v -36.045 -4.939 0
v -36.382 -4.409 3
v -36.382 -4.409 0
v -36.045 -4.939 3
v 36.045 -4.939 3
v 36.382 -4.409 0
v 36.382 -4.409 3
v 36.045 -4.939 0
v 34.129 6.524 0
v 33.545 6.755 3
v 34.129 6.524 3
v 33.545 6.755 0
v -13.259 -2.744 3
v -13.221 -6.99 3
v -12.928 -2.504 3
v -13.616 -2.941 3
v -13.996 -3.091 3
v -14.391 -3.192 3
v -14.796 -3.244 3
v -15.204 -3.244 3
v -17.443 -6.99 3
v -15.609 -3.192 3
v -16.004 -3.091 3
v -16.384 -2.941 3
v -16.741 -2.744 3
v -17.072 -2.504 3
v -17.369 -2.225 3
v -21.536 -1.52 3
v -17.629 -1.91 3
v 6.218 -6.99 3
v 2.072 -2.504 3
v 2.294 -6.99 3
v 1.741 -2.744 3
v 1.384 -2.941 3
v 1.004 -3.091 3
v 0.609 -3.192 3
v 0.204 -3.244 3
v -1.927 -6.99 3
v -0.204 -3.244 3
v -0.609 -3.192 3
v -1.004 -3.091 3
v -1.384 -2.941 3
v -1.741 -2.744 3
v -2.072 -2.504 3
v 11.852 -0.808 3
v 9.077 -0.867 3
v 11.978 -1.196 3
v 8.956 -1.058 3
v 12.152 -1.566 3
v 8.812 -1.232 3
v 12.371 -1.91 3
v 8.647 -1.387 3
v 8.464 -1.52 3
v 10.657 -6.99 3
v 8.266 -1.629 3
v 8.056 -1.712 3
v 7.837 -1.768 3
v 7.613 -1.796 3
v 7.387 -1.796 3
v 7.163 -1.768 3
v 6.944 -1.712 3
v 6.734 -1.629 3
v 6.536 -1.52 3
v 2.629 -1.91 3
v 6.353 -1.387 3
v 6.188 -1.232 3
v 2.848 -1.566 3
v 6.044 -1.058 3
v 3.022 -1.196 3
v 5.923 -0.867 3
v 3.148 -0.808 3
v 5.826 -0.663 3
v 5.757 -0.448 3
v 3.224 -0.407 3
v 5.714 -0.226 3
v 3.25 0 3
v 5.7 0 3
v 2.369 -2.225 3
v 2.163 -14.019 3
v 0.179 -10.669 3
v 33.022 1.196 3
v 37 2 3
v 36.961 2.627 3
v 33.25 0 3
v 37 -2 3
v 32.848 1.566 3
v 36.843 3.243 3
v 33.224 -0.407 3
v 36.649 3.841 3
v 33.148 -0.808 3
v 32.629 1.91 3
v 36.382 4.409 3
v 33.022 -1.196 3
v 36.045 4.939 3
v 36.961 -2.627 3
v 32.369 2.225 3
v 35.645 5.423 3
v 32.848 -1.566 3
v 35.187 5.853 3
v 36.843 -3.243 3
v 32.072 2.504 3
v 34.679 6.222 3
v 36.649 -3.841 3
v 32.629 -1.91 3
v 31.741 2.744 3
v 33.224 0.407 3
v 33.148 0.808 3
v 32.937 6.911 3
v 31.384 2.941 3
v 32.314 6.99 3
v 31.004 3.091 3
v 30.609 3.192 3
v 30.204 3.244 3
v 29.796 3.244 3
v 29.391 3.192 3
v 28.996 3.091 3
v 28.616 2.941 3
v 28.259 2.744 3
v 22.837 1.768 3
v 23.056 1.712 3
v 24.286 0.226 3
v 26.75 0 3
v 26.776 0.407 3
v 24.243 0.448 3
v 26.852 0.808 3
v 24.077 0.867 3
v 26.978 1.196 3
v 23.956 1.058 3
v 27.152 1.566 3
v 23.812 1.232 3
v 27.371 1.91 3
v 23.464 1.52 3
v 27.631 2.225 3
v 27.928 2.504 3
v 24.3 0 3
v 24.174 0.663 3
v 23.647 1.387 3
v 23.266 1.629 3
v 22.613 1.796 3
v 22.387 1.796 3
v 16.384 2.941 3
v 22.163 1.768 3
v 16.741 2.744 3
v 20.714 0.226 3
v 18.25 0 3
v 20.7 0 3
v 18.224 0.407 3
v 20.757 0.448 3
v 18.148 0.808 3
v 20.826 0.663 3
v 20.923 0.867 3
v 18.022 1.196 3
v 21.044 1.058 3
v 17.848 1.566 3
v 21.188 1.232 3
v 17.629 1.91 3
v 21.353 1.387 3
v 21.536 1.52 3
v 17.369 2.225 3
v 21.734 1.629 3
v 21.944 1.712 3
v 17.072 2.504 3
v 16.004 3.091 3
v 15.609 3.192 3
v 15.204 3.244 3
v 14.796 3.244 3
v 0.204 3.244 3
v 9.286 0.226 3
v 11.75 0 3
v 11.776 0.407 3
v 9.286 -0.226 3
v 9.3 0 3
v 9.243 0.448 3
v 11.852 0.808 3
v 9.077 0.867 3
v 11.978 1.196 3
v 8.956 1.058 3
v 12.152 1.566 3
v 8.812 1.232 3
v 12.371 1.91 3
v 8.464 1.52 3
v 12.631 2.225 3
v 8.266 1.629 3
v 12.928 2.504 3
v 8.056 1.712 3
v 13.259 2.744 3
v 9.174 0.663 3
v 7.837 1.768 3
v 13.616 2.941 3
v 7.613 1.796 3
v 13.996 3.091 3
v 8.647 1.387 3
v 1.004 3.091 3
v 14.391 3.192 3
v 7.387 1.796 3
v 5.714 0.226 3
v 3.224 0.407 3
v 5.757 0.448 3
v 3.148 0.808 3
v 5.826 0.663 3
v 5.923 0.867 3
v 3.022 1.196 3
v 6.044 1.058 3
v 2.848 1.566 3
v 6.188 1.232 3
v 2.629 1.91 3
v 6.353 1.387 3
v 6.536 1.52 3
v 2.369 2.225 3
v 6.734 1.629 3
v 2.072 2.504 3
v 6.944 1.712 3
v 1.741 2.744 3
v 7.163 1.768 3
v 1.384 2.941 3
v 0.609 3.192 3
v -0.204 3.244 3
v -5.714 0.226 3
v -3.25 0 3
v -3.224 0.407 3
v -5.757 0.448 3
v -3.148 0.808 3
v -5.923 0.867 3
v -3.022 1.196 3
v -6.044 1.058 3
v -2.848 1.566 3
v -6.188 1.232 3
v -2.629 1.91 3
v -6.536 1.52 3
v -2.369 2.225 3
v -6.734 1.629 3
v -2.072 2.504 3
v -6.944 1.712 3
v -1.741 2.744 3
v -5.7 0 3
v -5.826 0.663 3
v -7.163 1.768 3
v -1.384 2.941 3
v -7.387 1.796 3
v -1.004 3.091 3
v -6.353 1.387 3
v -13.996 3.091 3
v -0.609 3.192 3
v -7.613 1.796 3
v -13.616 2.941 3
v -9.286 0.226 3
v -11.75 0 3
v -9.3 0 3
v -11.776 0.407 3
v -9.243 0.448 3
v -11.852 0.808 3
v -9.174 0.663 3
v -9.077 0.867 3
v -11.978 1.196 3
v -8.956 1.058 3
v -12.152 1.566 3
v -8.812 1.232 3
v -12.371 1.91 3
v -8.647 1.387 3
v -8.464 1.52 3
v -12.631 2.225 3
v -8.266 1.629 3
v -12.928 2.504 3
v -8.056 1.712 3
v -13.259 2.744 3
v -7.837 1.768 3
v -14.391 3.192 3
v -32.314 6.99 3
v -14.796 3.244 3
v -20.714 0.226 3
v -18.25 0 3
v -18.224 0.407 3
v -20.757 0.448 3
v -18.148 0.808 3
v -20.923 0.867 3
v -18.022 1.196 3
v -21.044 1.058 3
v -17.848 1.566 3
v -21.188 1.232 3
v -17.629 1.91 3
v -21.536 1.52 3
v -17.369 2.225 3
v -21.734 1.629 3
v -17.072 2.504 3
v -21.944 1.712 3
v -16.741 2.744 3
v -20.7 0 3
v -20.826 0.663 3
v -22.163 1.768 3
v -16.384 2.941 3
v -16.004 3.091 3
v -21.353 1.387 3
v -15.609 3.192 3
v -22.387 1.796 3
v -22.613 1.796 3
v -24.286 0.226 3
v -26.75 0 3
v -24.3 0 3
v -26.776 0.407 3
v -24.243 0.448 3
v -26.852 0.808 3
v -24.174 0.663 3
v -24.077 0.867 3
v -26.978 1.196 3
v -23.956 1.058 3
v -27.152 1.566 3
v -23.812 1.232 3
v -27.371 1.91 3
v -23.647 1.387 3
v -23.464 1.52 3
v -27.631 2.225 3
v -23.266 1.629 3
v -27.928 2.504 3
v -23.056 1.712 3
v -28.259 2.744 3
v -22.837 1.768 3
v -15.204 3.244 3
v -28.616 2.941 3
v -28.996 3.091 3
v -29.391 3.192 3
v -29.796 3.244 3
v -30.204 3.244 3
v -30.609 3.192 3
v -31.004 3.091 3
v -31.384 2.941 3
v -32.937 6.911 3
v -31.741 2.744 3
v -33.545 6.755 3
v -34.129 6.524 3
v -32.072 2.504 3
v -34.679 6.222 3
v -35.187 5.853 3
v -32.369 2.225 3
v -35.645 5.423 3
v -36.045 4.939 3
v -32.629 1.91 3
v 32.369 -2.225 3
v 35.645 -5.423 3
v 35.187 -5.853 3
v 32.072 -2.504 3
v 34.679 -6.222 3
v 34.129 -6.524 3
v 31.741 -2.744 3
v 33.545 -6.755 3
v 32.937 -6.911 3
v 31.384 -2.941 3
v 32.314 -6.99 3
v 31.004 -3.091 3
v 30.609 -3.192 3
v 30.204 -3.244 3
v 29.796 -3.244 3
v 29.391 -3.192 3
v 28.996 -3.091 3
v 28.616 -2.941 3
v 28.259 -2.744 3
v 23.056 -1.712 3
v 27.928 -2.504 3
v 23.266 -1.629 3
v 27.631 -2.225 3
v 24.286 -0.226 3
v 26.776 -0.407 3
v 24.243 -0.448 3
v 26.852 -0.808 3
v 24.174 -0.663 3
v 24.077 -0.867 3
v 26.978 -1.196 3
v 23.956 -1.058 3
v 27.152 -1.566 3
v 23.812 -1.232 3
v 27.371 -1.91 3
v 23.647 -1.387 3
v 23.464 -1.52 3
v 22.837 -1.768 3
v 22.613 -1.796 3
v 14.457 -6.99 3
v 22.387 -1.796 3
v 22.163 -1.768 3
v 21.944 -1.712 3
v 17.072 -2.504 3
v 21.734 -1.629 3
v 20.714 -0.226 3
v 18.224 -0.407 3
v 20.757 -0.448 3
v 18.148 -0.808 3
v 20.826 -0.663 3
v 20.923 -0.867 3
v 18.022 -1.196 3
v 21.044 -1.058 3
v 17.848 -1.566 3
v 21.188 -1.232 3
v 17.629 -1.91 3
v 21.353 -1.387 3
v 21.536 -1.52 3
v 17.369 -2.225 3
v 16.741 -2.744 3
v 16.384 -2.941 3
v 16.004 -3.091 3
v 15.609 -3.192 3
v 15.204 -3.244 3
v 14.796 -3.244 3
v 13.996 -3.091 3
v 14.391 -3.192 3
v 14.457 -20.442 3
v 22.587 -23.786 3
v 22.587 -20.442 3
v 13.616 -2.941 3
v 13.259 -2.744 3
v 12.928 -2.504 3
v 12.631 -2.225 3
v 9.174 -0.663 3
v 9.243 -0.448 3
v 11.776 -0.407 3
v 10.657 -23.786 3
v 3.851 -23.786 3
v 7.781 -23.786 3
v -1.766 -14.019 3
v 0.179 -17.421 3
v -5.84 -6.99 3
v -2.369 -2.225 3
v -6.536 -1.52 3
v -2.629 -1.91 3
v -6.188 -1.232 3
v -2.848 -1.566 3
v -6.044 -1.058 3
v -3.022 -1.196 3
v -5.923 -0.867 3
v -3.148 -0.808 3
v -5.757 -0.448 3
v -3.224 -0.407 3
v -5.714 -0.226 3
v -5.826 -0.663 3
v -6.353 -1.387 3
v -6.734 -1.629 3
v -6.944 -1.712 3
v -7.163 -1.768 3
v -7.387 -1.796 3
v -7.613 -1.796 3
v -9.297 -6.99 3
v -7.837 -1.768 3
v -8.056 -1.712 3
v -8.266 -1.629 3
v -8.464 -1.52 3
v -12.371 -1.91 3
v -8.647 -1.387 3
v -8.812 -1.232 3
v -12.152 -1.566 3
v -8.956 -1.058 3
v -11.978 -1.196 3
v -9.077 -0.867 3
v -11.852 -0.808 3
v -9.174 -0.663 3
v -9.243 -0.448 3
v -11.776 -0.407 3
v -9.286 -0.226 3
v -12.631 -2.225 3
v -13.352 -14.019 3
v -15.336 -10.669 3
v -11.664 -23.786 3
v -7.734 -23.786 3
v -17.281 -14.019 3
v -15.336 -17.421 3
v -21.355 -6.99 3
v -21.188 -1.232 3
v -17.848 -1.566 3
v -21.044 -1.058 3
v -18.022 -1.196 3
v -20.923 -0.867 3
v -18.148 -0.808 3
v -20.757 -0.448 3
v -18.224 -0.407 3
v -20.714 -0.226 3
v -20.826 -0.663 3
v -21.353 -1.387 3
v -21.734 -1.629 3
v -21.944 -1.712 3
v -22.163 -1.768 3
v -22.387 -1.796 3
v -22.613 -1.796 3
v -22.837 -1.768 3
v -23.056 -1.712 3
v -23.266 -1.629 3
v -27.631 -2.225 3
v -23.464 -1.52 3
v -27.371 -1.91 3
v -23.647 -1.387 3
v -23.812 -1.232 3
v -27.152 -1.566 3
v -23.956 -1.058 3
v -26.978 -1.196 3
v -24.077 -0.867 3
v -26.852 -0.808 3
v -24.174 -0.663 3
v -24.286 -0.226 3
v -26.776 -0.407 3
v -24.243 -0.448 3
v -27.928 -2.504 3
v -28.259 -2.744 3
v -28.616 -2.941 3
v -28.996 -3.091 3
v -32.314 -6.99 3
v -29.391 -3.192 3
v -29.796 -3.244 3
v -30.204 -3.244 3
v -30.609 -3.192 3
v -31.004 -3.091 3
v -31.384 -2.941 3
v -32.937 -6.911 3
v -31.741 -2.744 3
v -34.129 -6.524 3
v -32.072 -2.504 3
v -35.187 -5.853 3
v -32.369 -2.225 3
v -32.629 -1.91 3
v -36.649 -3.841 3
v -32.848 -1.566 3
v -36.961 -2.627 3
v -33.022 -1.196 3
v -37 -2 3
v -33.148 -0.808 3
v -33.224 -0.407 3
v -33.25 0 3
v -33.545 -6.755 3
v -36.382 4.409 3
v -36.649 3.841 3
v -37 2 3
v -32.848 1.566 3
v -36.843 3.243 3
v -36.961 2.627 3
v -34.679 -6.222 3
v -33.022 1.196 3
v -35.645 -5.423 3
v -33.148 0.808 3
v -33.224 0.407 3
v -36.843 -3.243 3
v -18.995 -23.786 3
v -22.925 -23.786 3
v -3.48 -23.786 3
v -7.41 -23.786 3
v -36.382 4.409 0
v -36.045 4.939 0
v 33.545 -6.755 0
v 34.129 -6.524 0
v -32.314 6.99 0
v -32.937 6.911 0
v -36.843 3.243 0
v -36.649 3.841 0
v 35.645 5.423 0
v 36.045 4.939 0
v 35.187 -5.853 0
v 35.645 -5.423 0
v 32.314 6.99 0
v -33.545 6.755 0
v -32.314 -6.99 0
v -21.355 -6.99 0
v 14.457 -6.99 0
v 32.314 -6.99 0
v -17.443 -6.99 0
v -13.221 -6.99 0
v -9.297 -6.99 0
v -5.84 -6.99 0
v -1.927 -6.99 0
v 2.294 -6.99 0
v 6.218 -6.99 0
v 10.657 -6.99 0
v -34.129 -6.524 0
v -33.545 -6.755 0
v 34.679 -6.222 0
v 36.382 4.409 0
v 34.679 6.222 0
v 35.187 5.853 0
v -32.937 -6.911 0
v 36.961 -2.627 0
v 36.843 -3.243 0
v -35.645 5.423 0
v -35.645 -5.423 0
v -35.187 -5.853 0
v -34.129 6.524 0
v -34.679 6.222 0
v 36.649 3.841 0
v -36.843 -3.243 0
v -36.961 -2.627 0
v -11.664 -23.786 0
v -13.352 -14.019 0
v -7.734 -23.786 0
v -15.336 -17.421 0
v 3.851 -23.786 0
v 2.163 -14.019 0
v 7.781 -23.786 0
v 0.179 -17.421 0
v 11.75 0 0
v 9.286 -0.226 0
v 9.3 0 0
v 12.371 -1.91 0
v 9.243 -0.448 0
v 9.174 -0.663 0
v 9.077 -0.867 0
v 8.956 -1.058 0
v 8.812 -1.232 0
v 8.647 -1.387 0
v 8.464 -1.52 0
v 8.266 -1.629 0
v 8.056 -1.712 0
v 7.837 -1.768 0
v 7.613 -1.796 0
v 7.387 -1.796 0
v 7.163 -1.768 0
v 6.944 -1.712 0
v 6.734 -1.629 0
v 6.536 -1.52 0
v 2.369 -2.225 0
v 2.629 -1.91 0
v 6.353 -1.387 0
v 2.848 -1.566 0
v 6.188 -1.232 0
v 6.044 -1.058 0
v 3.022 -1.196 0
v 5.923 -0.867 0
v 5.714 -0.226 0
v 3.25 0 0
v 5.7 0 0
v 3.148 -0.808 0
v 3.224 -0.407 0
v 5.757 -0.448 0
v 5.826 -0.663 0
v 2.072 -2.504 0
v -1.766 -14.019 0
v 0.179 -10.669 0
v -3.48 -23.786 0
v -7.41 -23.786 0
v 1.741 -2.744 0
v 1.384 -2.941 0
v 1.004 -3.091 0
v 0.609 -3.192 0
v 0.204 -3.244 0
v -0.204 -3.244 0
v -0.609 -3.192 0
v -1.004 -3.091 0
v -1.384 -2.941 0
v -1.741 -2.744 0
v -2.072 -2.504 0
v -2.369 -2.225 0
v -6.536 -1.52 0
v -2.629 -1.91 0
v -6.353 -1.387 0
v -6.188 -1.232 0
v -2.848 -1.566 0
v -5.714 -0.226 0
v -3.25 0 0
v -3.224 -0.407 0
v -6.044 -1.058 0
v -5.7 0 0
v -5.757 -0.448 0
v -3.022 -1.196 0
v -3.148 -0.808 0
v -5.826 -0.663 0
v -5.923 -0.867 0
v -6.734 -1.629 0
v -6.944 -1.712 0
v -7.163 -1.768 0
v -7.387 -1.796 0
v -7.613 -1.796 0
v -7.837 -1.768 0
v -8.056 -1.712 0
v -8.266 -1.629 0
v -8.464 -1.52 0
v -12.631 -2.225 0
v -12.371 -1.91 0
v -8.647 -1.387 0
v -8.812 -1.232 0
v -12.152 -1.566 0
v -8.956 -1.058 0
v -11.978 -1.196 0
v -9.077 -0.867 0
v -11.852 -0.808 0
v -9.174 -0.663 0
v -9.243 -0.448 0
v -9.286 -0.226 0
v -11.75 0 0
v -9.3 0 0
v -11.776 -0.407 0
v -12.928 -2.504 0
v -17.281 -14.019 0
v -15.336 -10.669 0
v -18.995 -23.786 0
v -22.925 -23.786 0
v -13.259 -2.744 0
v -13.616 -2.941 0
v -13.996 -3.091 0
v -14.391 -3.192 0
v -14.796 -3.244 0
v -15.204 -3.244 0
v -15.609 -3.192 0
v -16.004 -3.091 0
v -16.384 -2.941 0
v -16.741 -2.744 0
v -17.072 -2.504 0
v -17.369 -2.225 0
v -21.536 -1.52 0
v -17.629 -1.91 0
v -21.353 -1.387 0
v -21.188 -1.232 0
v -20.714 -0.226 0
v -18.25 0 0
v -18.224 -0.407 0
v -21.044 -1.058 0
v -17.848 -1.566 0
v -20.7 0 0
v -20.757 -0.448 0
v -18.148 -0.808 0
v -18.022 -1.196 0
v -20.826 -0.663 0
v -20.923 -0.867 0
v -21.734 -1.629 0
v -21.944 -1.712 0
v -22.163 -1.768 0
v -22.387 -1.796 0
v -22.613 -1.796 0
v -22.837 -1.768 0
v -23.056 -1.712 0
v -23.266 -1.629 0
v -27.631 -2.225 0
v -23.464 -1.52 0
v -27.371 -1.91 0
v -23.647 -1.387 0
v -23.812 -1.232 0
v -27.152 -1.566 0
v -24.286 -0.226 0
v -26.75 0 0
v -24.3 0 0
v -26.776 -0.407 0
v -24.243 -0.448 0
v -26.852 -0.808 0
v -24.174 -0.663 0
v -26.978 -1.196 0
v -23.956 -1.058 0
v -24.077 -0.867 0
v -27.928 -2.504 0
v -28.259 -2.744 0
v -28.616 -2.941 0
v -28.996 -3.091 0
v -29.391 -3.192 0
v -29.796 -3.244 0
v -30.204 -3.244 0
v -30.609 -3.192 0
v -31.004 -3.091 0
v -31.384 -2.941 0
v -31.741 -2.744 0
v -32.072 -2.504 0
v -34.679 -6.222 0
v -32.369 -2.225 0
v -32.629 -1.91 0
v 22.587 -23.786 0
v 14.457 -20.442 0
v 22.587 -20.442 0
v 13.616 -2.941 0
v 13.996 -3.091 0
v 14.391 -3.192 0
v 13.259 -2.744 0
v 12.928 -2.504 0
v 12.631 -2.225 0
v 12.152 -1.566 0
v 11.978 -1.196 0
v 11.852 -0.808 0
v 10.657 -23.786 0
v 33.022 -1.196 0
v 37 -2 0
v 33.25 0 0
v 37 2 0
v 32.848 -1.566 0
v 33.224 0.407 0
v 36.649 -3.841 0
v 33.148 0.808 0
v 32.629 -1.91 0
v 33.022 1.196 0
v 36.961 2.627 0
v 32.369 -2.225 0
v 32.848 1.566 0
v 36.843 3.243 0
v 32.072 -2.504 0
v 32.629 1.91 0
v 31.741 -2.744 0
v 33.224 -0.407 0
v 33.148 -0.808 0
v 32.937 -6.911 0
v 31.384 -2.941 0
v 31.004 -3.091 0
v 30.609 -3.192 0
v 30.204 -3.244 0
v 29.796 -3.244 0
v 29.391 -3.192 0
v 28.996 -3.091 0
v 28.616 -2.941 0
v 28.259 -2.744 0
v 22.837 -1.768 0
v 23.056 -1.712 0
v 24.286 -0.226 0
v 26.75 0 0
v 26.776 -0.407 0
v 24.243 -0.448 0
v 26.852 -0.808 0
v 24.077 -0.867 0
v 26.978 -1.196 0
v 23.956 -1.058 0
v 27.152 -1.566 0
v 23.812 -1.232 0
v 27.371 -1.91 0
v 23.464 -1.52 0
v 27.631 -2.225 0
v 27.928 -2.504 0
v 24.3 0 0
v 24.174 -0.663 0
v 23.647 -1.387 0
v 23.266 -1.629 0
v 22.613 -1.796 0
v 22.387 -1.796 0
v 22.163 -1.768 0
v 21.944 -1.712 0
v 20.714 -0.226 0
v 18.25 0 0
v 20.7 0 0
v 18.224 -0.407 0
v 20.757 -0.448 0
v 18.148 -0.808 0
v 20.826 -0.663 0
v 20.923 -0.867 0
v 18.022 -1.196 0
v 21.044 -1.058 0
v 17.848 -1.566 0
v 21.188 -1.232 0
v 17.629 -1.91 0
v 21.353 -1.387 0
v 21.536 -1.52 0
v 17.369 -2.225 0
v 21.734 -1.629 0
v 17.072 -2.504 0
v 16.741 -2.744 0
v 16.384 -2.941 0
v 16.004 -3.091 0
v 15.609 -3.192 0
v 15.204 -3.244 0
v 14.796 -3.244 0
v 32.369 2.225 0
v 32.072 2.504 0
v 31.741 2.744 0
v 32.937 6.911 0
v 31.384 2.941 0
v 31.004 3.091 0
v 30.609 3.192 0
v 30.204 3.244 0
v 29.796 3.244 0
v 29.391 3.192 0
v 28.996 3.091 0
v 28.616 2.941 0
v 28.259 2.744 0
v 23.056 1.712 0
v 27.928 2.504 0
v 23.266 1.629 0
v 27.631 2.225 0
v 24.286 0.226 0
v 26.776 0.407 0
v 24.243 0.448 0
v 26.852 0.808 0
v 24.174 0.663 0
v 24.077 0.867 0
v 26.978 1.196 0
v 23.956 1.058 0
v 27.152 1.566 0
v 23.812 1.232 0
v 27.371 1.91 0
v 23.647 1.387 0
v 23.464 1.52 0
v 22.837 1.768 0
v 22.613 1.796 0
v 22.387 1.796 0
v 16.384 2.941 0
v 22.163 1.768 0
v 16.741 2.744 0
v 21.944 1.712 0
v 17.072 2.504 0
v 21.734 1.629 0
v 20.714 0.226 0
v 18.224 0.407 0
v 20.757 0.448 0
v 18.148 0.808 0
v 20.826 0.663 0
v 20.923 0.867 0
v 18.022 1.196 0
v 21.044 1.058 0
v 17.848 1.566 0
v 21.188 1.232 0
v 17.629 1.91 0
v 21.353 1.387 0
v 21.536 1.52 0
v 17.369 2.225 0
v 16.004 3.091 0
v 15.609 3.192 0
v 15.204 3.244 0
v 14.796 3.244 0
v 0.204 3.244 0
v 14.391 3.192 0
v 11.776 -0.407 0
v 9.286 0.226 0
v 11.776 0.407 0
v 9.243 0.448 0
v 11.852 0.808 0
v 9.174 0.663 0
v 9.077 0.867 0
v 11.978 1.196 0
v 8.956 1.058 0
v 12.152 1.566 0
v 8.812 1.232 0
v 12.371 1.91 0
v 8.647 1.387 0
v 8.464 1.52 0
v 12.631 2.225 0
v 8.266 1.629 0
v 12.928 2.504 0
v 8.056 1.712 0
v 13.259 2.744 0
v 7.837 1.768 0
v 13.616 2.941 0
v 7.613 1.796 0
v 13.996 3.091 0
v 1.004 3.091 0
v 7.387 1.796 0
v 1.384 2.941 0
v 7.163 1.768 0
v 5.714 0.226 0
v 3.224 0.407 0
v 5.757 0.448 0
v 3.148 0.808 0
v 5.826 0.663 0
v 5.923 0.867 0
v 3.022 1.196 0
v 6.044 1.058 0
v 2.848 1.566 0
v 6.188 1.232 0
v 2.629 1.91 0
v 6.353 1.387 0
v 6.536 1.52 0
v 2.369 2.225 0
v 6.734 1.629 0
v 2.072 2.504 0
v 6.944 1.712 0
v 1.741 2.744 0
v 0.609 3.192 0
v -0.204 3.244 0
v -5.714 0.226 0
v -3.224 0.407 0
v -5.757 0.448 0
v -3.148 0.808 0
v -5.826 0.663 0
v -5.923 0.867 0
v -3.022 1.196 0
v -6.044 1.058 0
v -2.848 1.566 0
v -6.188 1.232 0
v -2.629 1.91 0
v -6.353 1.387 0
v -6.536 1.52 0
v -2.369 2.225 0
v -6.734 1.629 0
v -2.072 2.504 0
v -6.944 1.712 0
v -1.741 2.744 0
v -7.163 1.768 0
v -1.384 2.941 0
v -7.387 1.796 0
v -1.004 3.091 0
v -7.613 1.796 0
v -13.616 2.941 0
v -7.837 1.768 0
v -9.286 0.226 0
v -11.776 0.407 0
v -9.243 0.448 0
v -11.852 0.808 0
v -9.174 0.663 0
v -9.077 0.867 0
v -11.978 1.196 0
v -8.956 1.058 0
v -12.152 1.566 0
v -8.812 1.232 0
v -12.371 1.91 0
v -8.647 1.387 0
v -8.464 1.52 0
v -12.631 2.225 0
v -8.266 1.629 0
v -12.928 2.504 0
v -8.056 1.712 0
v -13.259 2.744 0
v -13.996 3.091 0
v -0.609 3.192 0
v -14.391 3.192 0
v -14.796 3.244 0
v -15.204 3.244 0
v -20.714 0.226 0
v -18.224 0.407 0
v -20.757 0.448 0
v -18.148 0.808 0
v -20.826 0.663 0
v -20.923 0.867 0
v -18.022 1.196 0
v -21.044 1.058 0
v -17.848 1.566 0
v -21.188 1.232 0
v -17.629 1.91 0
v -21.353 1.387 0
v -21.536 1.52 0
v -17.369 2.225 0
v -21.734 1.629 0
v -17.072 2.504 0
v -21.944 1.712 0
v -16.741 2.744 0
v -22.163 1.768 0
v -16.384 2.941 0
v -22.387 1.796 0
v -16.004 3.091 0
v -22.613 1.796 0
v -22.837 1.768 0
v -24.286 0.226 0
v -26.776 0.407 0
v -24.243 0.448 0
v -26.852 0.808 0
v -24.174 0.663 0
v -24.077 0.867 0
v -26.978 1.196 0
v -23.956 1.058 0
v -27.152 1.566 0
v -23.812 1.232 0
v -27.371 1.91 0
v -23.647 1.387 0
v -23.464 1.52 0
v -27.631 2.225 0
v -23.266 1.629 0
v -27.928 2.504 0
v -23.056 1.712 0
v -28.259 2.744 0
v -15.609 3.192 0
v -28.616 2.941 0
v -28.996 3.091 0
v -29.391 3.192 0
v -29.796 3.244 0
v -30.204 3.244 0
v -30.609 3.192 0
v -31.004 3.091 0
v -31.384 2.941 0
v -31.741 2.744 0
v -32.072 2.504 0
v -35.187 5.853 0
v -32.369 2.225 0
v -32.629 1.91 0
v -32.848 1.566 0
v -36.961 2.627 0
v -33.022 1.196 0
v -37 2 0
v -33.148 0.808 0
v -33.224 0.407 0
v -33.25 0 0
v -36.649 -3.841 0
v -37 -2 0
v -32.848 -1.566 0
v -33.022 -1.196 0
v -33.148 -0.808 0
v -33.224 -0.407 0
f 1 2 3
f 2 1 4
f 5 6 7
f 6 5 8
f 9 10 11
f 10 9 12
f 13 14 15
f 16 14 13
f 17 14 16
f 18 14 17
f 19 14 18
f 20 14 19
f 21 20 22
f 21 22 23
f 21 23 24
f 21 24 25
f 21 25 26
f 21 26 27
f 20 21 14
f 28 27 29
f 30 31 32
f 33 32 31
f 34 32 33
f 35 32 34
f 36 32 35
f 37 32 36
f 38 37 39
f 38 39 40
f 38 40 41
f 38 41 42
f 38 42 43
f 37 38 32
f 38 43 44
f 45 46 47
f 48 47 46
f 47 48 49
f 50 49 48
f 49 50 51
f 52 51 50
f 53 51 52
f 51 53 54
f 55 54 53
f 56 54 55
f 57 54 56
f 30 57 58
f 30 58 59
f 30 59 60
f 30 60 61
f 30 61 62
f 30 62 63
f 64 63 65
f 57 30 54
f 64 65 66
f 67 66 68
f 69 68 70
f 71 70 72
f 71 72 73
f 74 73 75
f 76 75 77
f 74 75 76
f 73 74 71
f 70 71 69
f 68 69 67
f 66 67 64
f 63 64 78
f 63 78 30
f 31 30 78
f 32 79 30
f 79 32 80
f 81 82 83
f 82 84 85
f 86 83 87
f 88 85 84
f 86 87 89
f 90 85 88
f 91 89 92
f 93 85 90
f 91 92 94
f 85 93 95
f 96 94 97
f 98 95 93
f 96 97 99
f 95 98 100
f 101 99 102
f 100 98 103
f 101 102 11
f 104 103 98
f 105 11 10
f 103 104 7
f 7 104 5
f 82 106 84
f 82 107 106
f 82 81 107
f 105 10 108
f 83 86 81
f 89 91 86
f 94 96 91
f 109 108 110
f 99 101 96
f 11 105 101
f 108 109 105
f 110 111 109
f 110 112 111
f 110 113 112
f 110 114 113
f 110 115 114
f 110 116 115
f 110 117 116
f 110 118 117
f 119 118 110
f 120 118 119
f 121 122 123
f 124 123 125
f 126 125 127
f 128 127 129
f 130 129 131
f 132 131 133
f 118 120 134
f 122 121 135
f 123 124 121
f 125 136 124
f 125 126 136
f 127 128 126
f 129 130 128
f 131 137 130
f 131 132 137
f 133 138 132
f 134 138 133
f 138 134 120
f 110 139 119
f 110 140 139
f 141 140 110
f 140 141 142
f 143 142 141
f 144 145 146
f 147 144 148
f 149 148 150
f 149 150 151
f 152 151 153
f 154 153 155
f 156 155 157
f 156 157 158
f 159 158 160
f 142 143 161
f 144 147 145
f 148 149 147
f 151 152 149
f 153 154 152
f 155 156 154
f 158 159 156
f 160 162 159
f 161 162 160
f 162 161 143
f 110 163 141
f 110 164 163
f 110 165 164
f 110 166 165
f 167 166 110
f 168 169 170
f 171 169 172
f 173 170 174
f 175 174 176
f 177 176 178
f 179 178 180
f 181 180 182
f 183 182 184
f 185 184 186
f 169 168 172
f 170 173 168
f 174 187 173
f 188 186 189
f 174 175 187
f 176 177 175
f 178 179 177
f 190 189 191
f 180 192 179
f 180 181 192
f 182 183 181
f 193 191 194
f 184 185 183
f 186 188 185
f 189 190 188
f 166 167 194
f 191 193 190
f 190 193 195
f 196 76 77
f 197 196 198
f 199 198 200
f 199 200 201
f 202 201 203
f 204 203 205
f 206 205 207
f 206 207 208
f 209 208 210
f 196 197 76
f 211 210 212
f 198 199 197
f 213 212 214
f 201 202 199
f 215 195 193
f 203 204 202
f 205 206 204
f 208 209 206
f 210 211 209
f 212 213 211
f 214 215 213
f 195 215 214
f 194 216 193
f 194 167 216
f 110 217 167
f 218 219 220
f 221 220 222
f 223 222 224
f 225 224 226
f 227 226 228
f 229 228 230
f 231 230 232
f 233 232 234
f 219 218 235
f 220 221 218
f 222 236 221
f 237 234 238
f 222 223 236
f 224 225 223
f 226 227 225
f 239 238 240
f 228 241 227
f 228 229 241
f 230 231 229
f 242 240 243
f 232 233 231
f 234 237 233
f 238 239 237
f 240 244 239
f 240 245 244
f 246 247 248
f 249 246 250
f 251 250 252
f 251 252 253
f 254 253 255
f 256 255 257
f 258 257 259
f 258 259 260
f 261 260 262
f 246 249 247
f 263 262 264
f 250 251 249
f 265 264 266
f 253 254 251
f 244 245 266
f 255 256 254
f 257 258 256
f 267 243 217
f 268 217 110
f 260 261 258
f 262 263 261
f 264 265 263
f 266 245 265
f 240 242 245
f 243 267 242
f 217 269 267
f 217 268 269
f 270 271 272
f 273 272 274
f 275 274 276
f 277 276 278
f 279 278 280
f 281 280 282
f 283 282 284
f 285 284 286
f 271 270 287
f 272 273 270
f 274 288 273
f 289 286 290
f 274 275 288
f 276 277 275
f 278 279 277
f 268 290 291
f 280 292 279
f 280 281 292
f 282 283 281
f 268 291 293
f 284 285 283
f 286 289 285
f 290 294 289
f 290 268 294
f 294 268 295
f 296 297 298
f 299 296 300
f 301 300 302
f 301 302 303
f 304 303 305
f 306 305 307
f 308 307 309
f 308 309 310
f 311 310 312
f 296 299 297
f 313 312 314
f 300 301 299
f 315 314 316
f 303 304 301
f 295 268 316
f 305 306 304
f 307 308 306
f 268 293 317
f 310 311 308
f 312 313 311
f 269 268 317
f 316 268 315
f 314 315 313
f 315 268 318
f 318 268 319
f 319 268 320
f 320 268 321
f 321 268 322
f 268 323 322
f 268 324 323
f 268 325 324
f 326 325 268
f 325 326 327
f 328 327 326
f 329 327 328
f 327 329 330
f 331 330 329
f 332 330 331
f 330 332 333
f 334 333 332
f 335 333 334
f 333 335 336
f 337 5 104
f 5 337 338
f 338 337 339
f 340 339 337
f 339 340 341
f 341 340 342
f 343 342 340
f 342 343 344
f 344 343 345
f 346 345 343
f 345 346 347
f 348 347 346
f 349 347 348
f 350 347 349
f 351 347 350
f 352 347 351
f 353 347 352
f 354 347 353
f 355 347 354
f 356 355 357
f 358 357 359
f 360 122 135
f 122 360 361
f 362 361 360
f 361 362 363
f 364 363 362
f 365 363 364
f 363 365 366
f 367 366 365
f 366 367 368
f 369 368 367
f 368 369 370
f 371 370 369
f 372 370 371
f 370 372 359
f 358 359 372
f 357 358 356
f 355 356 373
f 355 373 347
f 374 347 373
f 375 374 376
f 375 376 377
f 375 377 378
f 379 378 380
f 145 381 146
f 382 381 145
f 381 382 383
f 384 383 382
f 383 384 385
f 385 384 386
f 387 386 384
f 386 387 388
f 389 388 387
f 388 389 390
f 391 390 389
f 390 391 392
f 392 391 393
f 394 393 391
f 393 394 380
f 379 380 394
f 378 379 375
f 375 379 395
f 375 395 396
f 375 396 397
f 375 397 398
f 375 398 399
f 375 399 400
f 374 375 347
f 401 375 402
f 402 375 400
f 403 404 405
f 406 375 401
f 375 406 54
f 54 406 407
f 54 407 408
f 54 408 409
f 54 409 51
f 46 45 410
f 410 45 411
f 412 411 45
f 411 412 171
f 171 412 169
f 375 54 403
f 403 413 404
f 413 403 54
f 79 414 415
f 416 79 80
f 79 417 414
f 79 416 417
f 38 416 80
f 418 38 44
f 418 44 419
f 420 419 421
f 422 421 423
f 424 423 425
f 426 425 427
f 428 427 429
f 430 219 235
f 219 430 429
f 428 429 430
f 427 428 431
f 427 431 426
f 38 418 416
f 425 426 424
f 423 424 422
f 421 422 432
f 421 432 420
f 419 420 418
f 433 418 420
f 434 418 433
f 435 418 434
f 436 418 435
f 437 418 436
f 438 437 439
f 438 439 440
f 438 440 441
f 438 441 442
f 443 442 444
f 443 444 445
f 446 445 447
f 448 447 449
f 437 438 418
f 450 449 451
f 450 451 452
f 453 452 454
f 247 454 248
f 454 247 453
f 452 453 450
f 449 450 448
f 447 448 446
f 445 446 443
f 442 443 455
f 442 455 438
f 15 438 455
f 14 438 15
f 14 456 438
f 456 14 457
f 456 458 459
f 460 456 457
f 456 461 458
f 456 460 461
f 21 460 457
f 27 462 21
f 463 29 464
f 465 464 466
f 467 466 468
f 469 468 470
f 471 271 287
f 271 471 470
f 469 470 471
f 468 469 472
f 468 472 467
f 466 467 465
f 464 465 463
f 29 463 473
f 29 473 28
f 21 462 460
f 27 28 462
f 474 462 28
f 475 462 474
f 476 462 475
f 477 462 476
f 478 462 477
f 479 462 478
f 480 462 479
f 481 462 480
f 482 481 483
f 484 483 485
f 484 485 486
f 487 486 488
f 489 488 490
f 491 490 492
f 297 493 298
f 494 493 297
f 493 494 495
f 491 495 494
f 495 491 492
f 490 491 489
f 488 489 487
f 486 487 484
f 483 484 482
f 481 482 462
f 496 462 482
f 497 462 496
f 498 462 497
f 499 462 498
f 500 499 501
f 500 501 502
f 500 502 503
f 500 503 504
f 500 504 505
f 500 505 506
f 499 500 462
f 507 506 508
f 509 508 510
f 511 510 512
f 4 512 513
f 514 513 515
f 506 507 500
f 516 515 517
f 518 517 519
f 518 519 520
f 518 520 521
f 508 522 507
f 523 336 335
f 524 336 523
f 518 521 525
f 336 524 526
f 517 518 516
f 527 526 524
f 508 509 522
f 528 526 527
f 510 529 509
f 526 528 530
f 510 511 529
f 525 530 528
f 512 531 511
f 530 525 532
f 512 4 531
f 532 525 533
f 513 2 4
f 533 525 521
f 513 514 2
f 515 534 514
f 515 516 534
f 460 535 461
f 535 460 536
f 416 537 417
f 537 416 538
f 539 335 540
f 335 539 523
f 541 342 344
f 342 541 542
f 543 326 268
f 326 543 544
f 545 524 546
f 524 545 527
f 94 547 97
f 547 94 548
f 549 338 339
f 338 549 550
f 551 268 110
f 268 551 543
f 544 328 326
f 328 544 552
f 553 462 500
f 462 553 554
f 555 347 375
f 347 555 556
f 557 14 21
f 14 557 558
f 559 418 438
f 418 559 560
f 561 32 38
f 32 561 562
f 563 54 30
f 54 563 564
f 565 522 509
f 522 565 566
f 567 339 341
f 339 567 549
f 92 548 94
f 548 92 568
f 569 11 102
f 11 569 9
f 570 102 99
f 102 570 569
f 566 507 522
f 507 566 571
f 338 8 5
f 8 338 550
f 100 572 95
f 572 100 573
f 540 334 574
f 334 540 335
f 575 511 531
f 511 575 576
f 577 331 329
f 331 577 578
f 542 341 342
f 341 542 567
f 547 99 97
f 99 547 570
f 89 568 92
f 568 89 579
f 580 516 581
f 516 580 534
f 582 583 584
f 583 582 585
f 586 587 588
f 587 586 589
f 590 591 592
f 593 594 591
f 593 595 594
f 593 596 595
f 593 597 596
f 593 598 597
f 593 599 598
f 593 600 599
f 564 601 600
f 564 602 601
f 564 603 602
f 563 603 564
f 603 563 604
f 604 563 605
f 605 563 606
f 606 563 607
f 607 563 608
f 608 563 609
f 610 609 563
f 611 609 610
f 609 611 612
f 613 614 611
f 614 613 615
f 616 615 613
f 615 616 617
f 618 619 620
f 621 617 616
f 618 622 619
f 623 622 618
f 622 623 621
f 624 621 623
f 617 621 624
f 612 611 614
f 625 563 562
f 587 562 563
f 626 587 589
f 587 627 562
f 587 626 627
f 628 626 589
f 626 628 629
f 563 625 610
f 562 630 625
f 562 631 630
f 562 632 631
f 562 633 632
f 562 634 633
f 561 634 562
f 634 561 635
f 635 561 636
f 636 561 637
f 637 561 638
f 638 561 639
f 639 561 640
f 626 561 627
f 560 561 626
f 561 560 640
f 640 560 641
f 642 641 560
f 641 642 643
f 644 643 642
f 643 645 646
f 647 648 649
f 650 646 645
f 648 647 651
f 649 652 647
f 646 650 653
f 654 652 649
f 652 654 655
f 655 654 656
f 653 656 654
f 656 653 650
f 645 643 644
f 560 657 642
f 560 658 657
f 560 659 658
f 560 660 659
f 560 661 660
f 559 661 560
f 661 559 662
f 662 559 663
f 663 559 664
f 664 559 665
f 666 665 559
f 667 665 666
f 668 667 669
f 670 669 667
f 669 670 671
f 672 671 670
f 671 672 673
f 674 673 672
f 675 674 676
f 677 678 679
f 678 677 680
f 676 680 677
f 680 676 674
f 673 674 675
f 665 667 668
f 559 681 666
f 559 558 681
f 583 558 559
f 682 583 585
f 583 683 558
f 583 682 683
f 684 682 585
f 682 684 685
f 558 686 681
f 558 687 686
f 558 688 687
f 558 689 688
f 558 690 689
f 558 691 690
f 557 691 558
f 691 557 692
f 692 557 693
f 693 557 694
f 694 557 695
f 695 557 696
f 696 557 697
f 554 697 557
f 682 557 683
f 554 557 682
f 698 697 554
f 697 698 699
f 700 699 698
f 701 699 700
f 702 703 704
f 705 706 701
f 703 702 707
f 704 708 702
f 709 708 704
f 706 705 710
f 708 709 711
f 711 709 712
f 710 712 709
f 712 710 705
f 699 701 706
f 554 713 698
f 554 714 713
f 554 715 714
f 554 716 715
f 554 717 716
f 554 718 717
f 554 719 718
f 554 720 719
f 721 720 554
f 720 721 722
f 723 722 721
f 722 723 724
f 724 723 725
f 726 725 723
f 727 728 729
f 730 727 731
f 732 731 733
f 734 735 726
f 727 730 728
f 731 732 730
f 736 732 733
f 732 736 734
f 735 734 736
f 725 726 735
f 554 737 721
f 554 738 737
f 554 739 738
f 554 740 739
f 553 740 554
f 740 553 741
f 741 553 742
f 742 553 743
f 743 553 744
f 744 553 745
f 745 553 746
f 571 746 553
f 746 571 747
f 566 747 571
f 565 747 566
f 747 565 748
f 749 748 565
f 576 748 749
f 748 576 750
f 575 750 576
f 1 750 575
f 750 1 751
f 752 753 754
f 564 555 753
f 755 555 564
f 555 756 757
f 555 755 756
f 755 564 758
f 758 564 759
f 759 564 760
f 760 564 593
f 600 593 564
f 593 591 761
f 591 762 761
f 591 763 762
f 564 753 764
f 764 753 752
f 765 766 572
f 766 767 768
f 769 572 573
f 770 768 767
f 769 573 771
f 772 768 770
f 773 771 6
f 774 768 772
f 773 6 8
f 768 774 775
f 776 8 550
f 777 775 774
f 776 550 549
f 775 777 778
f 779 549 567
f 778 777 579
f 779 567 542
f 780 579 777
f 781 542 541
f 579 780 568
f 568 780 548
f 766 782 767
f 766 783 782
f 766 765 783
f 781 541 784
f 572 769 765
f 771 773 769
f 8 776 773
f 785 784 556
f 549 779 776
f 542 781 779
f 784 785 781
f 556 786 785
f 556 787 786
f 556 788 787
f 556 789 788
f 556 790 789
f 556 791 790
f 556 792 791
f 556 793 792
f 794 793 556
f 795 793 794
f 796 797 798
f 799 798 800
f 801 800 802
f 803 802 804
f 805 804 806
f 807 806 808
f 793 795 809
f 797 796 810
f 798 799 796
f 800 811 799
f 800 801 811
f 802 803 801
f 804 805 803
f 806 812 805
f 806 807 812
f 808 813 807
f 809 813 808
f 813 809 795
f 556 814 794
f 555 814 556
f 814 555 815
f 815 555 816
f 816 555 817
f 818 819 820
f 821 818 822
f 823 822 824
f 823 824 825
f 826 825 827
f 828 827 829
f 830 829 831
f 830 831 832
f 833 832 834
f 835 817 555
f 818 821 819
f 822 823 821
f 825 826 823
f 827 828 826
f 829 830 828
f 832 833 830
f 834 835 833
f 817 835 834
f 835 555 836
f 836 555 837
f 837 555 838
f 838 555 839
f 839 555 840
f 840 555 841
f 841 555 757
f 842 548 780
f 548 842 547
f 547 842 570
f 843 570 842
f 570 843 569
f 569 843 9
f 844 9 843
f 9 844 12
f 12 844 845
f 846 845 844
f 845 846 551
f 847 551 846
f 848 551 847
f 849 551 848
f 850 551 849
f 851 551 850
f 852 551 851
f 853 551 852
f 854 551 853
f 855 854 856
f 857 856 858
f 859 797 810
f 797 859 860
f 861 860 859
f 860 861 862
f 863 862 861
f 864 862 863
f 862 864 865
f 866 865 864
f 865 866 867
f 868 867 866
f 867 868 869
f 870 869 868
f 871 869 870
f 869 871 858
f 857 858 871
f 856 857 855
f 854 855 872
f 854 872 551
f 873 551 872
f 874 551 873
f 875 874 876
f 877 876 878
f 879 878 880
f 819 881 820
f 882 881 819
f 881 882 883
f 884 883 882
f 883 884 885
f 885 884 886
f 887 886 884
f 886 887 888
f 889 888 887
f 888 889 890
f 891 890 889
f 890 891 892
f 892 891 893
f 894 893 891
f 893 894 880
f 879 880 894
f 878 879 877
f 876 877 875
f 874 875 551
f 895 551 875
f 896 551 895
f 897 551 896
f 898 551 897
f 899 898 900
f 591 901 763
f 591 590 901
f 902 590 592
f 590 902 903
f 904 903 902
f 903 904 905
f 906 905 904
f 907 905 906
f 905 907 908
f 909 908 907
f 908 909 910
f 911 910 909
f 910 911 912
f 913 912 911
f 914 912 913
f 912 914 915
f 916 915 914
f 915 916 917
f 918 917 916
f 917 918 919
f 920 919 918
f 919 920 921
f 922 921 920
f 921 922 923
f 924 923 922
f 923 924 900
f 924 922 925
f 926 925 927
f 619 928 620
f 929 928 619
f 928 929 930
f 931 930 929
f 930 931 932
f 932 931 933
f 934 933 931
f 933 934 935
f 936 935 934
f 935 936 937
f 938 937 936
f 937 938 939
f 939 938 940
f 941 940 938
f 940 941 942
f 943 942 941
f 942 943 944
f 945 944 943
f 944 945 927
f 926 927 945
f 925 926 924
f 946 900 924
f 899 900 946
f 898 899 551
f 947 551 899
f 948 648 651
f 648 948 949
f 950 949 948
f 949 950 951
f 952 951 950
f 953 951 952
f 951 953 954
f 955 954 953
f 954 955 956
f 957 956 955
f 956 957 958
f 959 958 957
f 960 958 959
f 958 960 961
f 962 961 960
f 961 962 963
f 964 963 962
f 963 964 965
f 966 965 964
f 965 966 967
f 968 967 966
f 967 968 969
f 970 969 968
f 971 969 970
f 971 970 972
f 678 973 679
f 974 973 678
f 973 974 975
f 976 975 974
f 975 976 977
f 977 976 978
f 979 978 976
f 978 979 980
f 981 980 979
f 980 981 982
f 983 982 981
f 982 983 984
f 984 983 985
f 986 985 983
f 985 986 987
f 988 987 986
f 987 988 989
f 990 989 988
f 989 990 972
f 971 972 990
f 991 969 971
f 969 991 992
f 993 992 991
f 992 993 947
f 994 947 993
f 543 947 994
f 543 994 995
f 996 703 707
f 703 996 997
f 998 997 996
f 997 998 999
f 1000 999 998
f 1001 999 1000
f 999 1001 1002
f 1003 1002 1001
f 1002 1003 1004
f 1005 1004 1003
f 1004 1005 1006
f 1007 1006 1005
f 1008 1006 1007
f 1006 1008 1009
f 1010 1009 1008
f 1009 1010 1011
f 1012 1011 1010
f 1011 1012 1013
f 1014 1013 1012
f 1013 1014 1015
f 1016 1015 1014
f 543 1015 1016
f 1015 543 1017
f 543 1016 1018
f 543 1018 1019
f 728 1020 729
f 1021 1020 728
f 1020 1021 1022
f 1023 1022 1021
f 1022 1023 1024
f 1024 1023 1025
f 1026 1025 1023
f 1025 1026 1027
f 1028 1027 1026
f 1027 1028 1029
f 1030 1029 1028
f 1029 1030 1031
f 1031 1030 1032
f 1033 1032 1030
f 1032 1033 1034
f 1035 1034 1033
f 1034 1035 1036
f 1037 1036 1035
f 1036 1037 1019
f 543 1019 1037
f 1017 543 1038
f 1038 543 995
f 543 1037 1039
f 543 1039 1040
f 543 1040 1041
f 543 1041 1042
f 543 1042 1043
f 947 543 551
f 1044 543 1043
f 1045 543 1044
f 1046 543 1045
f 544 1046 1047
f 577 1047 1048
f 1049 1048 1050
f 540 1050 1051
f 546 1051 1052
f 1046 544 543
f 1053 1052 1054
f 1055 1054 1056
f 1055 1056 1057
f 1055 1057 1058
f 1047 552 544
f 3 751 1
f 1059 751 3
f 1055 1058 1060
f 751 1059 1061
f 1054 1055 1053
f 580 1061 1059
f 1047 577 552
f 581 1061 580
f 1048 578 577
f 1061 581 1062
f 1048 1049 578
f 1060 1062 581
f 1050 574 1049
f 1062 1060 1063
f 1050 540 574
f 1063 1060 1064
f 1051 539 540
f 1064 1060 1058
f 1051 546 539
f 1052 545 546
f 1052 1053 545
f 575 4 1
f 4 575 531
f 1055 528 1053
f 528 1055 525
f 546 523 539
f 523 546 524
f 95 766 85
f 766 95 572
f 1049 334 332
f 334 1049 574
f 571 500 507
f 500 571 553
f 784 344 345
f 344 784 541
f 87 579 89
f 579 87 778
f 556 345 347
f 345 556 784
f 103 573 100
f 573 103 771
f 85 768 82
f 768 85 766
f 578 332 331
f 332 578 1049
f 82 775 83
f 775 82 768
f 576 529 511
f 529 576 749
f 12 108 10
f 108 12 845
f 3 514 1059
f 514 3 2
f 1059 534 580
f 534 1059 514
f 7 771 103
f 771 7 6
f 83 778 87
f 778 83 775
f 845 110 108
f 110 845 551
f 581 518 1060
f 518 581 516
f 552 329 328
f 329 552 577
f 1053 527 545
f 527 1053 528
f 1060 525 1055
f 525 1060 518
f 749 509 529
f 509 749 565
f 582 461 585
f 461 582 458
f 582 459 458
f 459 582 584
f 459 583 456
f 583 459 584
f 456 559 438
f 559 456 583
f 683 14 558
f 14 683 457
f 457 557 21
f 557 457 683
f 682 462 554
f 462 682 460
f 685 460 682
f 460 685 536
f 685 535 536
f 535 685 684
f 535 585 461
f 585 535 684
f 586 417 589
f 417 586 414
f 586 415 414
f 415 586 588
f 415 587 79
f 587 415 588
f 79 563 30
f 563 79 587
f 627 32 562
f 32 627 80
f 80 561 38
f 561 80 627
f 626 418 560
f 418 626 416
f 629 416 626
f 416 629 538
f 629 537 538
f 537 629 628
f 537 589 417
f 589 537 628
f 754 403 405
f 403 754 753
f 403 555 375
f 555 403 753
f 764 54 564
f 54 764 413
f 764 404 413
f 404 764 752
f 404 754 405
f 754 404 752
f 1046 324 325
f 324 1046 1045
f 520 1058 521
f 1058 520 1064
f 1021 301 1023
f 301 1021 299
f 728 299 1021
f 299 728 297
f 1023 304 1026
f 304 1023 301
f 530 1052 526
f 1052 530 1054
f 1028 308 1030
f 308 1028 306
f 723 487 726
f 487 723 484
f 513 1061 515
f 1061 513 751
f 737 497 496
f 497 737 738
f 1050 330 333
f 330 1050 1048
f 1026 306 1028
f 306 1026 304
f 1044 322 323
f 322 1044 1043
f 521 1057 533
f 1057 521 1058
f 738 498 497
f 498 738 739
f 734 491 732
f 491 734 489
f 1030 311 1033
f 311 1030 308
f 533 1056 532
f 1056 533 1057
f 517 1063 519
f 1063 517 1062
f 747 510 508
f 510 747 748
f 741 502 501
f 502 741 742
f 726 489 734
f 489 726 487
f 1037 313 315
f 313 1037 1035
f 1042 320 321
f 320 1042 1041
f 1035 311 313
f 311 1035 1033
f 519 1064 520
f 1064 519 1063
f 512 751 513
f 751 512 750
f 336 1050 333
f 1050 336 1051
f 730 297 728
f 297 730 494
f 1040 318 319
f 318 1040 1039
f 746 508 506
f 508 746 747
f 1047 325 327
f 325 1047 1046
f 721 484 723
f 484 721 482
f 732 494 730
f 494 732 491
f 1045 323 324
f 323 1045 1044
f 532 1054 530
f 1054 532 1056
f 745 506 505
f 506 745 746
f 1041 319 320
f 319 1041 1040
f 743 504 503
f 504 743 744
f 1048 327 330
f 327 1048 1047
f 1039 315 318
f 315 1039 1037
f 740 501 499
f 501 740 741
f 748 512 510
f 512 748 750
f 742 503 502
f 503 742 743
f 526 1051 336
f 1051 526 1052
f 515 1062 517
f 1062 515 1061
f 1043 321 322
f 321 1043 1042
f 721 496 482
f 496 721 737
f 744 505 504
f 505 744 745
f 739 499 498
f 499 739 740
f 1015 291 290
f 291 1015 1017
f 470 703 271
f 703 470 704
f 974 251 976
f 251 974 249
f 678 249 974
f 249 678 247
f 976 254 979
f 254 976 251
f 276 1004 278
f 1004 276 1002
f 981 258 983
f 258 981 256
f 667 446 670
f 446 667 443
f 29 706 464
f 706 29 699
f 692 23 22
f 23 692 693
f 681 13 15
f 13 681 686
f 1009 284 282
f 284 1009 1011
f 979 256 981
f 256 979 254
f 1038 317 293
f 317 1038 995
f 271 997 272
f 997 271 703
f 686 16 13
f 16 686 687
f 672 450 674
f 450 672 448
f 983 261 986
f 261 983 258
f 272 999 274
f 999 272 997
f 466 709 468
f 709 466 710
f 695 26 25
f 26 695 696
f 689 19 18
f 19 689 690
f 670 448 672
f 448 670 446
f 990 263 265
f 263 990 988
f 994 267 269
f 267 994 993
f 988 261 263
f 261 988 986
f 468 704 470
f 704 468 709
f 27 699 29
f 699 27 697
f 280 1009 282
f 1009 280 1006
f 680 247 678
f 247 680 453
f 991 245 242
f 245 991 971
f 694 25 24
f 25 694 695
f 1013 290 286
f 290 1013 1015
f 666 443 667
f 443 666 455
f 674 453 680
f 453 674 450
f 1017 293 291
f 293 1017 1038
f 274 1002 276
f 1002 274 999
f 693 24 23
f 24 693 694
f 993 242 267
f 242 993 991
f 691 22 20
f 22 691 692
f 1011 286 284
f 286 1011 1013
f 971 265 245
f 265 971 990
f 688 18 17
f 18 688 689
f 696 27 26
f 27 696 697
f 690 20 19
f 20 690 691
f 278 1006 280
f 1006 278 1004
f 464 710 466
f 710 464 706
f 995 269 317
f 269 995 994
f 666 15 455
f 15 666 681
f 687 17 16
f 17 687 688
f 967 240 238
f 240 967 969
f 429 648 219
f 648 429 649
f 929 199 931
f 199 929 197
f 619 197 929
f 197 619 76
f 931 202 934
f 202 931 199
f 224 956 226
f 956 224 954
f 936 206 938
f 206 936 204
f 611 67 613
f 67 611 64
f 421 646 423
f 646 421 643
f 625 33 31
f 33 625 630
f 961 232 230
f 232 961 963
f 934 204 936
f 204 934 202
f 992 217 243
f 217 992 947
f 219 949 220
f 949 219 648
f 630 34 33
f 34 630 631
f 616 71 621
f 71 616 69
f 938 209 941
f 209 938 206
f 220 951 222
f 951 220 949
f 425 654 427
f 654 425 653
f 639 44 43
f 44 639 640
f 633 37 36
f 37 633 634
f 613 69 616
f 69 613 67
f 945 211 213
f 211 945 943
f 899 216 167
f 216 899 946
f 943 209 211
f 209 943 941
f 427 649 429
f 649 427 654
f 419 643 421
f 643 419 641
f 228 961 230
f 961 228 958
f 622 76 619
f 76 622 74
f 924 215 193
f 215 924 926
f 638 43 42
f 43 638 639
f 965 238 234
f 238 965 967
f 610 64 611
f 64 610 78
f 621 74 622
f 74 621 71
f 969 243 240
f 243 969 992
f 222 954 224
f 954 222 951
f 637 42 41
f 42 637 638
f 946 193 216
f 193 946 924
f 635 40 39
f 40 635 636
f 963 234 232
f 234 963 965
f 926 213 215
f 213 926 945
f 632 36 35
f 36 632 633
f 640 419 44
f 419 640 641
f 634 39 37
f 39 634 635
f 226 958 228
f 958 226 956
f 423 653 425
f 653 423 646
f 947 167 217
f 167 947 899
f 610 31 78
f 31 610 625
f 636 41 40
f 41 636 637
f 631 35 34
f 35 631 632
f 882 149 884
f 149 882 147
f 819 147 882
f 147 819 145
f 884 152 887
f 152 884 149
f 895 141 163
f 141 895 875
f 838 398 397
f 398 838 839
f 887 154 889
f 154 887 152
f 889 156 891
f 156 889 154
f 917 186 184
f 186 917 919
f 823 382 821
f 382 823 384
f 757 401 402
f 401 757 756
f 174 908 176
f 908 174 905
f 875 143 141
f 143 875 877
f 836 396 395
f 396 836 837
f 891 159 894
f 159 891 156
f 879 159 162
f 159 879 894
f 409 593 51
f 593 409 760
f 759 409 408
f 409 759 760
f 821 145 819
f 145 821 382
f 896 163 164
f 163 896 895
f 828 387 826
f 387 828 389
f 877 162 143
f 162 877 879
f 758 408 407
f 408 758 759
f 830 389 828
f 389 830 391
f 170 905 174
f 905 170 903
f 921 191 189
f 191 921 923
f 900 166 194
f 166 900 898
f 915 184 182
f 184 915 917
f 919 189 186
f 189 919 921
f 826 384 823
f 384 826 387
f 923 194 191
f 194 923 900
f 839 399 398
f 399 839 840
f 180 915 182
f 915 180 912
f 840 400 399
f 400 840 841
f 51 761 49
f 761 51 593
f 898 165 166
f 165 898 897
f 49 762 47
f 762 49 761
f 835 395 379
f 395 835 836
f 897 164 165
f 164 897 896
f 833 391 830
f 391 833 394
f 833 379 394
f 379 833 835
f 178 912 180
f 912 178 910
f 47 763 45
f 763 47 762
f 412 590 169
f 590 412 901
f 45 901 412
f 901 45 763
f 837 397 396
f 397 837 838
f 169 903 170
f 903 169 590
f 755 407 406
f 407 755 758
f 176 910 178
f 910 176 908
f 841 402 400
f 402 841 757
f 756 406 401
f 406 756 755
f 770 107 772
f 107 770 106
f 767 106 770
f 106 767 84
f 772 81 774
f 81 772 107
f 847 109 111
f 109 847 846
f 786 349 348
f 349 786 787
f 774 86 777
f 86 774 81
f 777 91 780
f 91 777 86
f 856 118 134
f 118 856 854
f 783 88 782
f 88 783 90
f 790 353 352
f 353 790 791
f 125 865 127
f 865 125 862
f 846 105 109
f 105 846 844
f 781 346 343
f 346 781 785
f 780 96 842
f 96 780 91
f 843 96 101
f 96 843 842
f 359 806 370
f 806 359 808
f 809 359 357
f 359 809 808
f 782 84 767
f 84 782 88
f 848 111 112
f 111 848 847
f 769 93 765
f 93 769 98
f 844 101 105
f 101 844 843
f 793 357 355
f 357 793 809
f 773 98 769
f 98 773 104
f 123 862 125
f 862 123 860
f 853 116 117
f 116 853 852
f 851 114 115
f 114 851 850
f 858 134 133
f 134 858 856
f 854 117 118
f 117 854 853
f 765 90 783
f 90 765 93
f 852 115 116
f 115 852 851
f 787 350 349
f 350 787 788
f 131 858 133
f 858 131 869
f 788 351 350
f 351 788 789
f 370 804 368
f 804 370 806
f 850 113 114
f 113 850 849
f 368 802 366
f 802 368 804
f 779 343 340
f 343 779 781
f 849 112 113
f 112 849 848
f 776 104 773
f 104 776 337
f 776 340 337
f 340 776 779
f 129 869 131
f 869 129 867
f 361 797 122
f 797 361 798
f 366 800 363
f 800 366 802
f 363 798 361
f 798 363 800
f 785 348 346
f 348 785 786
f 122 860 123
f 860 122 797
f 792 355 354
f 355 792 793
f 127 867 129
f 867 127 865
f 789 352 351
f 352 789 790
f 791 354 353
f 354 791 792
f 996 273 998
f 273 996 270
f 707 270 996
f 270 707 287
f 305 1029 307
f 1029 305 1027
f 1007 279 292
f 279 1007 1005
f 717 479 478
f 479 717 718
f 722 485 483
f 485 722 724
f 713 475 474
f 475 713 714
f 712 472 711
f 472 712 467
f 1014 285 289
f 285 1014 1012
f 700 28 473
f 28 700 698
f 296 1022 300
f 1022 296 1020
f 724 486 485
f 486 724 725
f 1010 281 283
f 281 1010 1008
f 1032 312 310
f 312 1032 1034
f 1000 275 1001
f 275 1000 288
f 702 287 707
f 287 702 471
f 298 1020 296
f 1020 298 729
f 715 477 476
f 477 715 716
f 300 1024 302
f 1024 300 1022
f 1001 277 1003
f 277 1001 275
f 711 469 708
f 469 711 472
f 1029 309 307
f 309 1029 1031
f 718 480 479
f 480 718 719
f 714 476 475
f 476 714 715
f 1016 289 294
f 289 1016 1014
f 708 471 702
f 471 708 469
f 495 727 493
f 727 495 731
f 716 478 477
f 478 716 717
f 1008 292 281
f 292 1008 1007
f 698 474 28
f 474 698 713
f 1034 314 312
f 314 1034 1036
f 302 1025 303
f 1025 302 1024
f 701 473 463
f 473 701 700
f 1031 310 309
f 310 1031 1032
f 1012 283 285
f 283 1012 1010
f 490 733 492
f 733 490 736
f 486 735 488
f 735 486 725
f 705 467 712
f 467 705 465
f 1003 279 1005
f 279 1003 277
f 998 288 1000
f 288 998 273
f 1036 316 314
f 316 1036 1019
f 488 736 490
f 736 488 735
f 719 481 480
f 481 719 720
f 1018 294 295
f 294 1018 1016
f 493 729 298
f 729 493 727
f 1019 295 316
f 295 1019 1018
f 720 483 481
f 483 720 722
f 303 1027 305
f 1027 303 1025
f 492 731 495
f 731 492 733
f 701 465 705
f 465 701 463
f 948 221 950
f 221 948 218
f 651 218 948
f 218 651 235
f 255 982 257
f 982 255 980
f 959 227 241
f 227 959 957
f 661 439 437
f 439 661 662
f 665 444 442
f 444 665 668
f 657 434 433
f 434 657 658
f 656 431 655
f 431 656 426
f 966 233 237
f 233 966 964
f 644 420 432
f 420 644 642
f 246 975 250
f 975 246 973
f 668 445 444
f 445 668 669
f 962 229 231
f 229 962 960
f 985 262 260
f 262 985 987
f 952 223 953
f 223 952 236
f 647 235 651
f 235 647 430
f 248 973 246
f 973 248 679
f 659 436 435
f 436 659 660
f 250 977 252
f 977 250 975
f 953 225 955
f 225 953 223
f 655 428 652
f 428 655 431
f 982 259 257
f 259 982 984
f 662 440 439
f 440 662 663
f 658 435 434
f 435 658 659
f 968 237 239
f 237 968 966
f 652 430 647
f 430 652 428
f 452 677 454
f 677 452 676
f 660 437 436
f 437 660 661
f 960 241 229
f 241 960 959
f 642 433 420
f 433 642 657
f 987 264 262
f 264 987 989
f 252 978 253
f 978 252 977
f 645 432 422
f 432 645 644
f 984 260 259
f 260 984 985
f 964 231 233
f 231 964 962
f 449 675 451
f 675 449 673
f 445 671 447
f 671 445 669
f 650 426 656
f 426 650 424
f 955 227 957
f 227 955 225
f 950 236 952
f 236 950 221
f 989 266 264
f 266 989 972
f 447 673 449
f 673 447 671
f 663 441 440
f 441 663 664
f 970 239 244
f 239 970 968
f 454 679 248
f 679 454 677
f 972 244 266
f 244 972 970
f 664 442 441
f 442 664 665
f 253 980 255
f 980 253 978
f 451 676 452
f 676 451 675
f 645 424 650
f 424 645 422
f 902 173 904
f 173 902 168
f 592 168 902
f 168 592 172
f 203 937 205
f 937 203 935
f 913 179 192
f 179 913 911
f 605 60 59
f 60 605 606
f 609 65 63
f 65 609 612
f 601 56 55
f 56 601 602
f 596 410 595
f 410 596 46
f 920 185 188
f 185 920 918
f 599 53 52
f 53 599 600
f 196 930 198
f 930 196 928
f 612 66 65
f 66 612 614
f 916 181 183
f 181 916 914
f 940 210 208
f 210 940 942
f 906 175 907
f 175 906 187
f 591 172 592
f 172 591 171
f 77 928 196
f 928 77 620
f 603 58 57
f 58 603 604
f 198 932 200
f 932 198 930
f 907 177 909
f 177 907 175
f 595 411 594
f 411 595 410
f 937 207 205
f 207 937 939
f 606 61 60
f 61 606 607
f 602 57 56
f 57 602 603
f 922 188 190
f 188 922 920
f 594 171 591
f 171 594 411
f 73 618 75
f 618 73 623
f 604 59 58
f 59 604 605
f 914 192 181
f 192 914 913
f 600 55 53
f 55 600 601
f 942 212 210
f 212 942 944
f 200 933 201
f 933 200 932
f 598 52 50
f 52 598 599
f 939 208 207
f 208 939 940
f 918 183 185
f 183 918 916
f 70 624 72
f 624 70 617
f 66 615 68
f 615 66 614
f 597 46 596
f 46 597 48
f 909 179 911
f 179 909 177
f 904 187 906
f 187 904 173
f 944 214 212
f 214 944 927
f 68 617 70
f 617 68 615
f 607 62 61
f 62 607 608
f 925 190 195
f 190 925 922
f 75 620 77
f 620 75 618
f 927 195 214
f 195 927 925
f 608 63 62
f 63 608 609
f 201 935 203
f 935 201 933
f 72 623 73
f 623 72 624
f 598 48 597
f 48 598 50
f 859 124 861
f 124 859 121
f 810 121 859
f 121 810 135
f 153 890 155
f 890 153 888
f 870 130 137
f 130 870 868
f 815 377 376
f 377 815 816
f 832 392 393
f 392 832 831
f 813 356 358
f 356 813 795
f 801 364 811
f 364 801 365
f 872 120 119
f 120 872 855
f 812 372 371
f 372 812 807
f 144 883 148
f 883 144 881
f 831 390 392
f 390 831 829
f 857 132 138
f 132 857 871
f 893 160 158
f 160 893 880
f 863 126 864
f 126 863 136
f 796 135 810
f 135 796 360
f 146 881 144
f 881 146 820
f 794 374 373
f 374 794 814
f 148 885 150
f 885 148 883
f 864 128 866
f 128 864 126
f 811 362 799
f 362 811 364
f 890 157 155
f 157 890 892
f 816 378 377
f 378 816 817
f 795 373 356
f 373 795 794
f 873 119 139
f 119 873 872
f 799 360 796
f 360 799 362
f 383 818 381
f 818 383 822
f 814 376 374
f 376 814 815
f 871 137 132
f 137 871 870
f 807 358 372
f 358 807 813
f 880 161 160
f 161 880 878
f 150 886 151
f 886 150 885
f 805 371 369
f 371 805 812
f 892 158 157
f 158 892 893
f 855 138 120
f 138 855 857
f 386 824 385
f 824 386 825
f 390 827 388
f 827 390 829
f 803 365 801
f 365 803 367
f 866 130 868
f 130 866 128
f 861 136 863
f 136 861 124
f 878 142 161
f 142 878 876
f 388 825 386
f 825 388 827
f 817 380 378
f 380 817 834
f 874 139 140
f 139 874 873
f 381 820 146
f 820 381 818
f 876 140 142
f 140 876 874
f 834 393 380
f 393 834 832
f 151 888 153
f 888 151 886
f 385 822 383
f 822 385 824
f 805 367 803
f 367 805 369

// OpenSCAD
$fn = 50;


difference() {
	union() {
		hull() {
			translate(v = [-32.0000000000, 2.0000000000, 0]) {
				cylinder(h = 3, r = 5);
			}
			translate(v = [32.0000000000, 2.0000000000, 0]) {
				cylinder(h = 3, r = 5);
			}
			translate(v = [-32.0000000000, -2.0000000000, 0]) {
				cylinder(h = 3, r = 5);
			}
			translate(v = [32.0000000000, -2.0000000000, 0]) {
				cylinder(h = 3, r = 5);
			}
		}
		translate(v = [0, -5, 0]) {
			linear_extrude(height = 3) {
				text(font = "DejaVu Sans Mono:style=Bold", halign = "center", size = 19.0000000000, text = "XXL", valign = "top");
			}
		}
	}
	union() {
		translate(v = [-30.0000000000, 0.0000000000, 0]) {
			translate(v = [0, 0, -100]) {
				cylinder(h = 200, r = 3.2500000000);
			}
		}
		translate(v = [-15.0000000000, 0.0000000000, 0]) {
			translate(v = [0, 0, -100]) {
				cylinder(h = 200, r = 3.2500000000);
			}
		}
		translate(v = [0, 0, -100]) {
			cylinder(h = 200, r = 3.2500000000);
		}
		translate(v = [15.0000000000, 0.0000000000, 0]) {
			translate(v = [0, 0, -100]) {
				cylinder(h = 200, r = 3.2500000000);
			}
		}
		translate(v = [30.0000000000, 0.0000000000, 0]) {
			translate(v = [0, 0, -100]) {
				cylinder(h = 200, r = 3.2500000000);
			}
		}
		translate(v = [-30.0000000000, 0.0000000000, 0]) {
			translate(v = [0, 0, -100]) {
				cylinder(h = 200, r = 1.8000000000);
			}
		}
		translate(v = [-22.5000000000, 0.0000000000, 0]) {
			translate(v = [0, 0, -100]) {
				cylinder(h = 200, r = 1.8000000000);
			}
		}
		translate(v = [-15.0000000000, 0.0000000000, 0]) {
			translate(v = [0, 0, -100]) {
				cylinder(h = 200, r = 1.8000000000);
			}
		}
		translate(v = [-7.5000000000, 0.0000000000, 0]) {
			translate(v = [0, 0, -100]) {
				cylinder(h = 200, r = 1.8000000000);
			}
		}
		translate(v = [0, 0, -100]) {
			cylinder(h = 200, r = 1.8000000000);
		}
		translate(v = [7.5000000000, 0.0000000000, 0]) {
			translate(v = [0, 0, -100]) {
				cylinder(h = 200, r = 1.8000000000);
			}
		}
		translate(v = [15.0000000000, 0.0000000000, 0]) {
			translate(v = [0, 0, -100]) {
				cylinder(h = 200, r = 1.8000000000);
			}
		}
		translate(v = [22.5000000000, 0.0000000000, 0]) {
			translate(v = [0, 0, -100]) {
				cylinder(h = 200, r = 1.8000000000);
			}
		}
		translate(v = [30.0000000000, 0.0000000000, 0]) {
			translate(v = [0, 0, -100]) {
				cylinder(h = 200, r = 1.8000000000);
			}
		}
	}
}
